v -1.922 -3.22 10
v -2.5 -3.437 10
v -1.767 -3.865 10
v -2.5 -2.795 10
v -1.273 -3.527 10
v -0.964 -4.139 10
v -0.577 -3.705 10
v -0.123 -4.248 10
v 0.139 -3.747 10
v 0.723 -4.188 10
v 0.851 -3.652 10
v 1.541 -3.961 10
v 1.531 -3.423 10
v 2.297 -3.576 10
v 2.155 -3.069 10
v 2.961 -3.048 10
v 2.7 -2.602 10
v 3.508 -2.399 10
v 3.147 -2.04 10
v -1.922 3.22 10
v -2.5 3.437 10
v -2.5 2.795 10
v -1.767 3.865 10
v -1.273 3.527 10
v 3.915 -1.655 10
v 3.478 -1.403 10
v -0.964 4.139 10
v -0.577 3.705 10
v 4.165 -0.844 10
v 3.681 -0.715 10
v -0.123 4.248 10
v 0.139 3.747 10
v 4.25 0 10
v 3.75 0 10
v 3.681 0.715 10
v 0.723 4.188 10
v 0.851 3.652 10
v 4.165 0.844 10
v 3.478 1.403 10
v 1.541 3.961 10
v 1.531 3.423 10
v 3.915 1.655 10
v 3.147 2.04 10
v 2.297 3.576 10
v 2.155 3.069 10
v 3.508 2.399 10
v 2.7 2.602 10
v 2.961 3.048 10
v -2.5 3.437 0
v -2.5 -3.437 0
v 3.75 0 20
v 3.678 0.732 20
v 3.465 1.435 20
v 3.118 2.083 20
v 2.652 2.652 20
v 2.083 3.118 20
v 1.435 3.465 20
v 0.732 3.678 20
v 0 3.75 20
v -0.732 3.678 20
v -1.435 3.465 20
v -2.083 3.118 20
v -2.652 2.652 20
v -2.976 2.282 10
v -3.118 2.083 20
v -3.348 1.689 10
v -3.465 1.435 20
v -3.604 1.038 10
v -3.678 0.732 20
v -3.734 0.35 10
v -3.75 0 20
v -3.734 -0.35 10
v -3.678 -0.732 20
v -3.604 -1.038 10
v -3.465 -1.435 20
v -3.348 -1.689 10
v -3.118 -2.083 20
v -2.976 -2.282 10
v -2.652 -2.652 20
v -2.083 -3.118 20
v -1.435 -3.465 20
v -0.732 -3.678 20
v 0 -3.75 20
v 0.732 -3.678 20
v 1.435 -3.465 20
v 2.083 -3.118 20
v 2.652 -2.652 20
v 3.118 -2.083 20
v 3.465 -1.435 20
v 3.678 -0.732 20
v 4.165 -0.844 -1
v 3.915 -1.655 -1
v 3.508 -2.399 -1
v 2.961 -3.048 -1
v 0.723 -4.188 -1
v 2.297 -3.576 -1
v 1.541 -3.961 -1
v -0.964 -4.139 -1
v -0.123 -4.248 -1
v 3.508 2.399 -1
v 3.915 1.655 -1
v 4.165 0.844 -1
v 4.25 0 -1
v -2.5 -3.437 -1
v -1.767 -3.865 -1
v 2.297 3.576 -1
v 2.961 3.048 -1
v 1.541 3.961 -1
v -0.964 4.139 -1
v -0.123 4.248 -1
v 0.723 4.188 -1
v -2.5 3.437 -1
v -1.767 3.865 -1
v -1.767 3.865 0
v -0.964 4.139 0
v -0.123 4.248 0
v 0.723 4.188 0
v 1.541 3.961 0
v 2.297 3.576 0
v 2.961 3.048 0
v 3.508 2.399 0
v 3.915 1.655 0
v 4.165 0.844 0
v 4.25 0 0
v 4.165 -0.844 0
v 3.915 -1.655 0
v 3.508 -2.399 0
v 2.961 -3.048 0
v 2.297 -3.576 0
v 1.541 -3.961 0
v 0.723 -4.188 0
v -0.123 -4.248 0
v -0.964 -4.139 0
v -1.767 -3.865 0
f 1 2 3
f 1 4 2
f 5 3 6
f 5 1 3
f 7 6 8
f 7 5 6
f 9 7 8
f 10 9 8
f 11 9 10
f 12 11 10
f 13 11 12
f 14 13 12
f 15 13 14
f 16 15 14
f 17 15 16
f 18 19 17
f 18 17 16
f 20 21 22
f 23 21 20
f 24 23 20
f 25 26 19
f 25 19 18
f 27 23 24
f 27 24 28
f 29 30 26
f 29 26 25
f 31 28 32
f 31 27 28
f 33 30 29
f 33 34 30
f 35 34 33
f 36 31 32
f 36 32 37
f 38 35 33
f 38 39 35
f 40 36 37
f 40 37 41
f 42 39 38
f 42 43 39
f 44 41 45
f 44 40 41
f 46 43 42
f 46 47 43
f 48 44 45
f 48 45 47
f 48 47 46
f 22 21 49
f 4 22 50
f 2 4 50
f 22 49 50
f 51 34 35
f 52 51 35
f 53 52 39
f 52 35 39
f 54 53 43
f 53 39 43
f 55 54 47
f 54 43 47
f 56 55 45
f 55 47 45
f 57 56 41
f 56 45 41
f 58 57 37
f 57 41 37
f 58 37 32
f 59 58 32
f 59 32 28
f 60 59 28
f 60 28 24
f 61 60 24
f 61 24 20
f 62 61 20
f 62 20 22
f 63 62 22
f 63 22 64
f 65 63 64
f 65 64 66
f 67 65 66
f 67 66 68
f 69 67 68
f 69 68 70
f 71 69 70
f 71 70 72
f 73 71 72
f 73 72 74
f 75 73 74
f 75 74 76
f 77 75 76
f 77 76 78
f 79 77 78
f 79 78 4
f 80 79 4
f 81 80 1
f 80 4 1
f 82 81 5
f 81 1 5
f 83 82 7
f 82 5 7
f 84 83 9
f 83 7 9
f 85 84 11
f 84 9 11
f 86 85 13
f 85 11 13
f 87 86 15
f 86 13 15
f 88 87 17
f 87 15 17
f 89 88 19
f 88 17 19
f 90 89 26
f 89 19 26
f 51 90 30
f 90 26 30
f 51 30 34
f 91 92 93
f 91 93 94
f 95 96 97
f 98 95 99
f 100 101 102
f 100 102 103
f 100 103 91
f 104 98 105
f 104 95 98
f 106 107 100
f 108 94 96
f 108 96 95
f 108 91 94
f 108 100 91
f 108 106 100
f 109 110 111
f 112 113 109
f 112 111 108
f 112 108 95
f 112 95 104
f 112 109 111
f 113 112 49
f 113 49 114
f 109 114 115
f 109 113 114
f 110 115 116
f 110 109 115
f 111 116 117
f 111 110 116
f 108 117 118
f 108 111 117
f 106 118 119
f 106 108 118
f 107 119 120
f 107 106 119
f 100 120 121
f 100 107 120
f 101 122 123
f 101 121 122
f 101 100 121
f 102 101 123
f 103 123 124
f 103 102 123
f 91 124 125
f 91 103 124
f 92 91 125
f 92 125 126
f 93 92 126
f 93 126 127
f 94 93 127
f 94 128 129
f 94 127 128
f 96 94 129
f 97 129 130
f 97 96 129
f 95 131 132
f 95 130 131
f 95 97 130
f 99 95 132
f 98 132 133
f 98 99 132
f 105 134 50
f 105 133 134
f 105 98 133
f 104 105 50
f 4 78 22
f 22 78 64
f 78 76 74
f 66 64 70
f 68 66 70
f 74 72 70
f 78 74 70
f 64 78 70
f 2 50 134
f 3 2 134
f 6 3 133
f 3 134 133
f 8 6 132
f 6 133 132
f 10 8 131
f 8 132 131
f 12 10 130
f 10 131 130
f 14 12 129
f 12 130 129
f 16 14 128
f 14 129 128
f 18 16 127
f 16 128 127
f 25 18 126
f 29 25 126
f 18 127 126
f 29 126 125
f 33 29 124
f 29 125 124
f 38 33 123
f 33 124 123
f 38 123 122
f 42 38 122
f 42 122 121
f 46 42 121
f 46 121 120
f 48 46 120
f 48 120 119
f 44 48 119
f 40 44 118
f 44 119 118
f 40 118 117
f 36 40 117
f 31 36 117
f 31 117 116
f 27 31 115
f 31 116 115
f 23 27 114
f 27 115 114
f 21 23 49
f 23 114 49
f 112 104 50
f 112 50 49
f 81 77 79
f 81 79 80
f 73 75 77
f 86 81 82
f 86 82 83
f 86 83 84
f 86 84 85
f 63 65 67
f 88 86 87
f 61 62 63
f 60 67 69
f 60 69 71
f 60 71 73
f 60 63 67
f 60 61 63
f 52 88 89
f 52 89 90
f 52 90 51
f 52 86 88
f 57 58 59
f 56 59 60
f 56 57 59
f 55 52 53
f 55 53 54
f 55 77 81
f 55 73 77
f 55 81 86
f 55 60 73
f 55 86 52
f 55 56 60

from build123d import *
from build123d.topology import SkipClean

# Parameters (mm, degrees)
BOSS_EXTRUDE1_DEPTH = 10
SKETCH2_R           = 4.25
BOSS_EXTRUDE2_DEPTH = 20
BOSS_EXTRUDE3_START = 1
BOSS_EXTRUDE3_DEPTH = 1
CUT_EXTRUDE1_START  = -20
SKETCH5_R           = 4.25
SKETCH5_R_2         = 3.75
CUT_EXTRUDE1_DEPTH  = 20
CUT_EXTRUDE2_START  = -10
SKETCH6_R           = 3.75
CUT_EXTRUDE2_DEPTH  = 10


with BuildPart() as part:
    # Sketch1 → Boss-Extrude1 (new body)
    with BuildSketch(Plane.XY):
        with BuildLine():
            Line((-2.5, 3.436931771), (-2.5, -3.436931771))
            ThreePointArc((-2.5, -3.436931771), (4.25, 0), (-2.5, 3.436931771))
        make_face()
    extrude(amount=BOSS_EXTRUDE1_DEPTH)

    # Sketch2 → Boss-Extrude2 (add)
    with BuildSketch(Plane.XY.offset(10)):
        with Locations(Location((0, 0, 0), (0, 0, 126.031879072))):
            Circle(SKETCH2_R)
    extrude(amount=BOSS_EXTRUDE2_DEPTH)

    # Sketch3 → Boss-Extrude3 (add)
    with SkipClean():  # the faces are left unmerged after this step: merging them gives an invalid solid
        with BuildSketch(Plane(origin=(0, 0, 0), x_dir=(-1, 0, 0), z_dir=(0, 0, -1)).offset(BOSS_EXTRUDE3_START)):
            with BuildLine():
                Line((2.5, -3.436931771), (2.5, 3.436931771))
                ThreePointArc((2.5, 3.436931771), (-4.25, 0), (2.5, -3.436931771))
            make_face()
        extrude(amount=-BOSS_EXTRUDE3_DEPTH)

    # Sketch5 → Cut-Extrude1 (cut)
    with SkipClean():  # the faces are left unmerged after this step: merging them gives an invalid solid
        with BuildSketch(Plane.XY.offset(30).offset(CUT_EXTRUDE1_START)):
            Circle(SKETCH5_R)
            Circle(SKETCH5_R_2, mode=Mode.SUBTRACT)
        extrude(amount=CUT_EXTRUDE1_DEPTH, mode=Mode.SUBTRACT)

    # Sketch6 → Cut-Extrude2 (cut)
    with SkipClean():  # the faces are left unmerged after this step: merging them gives an invalid solid
        with BuildSketch(Plane.XY.offset(30).offset(CUT_EXTRUDE2_START)):
            Circle(SKETCH6_R)
        extrude(amount=CUT_EXTRUDE2_DEPTH, mode=Mode.SUBTRACT)


solid = part.part
